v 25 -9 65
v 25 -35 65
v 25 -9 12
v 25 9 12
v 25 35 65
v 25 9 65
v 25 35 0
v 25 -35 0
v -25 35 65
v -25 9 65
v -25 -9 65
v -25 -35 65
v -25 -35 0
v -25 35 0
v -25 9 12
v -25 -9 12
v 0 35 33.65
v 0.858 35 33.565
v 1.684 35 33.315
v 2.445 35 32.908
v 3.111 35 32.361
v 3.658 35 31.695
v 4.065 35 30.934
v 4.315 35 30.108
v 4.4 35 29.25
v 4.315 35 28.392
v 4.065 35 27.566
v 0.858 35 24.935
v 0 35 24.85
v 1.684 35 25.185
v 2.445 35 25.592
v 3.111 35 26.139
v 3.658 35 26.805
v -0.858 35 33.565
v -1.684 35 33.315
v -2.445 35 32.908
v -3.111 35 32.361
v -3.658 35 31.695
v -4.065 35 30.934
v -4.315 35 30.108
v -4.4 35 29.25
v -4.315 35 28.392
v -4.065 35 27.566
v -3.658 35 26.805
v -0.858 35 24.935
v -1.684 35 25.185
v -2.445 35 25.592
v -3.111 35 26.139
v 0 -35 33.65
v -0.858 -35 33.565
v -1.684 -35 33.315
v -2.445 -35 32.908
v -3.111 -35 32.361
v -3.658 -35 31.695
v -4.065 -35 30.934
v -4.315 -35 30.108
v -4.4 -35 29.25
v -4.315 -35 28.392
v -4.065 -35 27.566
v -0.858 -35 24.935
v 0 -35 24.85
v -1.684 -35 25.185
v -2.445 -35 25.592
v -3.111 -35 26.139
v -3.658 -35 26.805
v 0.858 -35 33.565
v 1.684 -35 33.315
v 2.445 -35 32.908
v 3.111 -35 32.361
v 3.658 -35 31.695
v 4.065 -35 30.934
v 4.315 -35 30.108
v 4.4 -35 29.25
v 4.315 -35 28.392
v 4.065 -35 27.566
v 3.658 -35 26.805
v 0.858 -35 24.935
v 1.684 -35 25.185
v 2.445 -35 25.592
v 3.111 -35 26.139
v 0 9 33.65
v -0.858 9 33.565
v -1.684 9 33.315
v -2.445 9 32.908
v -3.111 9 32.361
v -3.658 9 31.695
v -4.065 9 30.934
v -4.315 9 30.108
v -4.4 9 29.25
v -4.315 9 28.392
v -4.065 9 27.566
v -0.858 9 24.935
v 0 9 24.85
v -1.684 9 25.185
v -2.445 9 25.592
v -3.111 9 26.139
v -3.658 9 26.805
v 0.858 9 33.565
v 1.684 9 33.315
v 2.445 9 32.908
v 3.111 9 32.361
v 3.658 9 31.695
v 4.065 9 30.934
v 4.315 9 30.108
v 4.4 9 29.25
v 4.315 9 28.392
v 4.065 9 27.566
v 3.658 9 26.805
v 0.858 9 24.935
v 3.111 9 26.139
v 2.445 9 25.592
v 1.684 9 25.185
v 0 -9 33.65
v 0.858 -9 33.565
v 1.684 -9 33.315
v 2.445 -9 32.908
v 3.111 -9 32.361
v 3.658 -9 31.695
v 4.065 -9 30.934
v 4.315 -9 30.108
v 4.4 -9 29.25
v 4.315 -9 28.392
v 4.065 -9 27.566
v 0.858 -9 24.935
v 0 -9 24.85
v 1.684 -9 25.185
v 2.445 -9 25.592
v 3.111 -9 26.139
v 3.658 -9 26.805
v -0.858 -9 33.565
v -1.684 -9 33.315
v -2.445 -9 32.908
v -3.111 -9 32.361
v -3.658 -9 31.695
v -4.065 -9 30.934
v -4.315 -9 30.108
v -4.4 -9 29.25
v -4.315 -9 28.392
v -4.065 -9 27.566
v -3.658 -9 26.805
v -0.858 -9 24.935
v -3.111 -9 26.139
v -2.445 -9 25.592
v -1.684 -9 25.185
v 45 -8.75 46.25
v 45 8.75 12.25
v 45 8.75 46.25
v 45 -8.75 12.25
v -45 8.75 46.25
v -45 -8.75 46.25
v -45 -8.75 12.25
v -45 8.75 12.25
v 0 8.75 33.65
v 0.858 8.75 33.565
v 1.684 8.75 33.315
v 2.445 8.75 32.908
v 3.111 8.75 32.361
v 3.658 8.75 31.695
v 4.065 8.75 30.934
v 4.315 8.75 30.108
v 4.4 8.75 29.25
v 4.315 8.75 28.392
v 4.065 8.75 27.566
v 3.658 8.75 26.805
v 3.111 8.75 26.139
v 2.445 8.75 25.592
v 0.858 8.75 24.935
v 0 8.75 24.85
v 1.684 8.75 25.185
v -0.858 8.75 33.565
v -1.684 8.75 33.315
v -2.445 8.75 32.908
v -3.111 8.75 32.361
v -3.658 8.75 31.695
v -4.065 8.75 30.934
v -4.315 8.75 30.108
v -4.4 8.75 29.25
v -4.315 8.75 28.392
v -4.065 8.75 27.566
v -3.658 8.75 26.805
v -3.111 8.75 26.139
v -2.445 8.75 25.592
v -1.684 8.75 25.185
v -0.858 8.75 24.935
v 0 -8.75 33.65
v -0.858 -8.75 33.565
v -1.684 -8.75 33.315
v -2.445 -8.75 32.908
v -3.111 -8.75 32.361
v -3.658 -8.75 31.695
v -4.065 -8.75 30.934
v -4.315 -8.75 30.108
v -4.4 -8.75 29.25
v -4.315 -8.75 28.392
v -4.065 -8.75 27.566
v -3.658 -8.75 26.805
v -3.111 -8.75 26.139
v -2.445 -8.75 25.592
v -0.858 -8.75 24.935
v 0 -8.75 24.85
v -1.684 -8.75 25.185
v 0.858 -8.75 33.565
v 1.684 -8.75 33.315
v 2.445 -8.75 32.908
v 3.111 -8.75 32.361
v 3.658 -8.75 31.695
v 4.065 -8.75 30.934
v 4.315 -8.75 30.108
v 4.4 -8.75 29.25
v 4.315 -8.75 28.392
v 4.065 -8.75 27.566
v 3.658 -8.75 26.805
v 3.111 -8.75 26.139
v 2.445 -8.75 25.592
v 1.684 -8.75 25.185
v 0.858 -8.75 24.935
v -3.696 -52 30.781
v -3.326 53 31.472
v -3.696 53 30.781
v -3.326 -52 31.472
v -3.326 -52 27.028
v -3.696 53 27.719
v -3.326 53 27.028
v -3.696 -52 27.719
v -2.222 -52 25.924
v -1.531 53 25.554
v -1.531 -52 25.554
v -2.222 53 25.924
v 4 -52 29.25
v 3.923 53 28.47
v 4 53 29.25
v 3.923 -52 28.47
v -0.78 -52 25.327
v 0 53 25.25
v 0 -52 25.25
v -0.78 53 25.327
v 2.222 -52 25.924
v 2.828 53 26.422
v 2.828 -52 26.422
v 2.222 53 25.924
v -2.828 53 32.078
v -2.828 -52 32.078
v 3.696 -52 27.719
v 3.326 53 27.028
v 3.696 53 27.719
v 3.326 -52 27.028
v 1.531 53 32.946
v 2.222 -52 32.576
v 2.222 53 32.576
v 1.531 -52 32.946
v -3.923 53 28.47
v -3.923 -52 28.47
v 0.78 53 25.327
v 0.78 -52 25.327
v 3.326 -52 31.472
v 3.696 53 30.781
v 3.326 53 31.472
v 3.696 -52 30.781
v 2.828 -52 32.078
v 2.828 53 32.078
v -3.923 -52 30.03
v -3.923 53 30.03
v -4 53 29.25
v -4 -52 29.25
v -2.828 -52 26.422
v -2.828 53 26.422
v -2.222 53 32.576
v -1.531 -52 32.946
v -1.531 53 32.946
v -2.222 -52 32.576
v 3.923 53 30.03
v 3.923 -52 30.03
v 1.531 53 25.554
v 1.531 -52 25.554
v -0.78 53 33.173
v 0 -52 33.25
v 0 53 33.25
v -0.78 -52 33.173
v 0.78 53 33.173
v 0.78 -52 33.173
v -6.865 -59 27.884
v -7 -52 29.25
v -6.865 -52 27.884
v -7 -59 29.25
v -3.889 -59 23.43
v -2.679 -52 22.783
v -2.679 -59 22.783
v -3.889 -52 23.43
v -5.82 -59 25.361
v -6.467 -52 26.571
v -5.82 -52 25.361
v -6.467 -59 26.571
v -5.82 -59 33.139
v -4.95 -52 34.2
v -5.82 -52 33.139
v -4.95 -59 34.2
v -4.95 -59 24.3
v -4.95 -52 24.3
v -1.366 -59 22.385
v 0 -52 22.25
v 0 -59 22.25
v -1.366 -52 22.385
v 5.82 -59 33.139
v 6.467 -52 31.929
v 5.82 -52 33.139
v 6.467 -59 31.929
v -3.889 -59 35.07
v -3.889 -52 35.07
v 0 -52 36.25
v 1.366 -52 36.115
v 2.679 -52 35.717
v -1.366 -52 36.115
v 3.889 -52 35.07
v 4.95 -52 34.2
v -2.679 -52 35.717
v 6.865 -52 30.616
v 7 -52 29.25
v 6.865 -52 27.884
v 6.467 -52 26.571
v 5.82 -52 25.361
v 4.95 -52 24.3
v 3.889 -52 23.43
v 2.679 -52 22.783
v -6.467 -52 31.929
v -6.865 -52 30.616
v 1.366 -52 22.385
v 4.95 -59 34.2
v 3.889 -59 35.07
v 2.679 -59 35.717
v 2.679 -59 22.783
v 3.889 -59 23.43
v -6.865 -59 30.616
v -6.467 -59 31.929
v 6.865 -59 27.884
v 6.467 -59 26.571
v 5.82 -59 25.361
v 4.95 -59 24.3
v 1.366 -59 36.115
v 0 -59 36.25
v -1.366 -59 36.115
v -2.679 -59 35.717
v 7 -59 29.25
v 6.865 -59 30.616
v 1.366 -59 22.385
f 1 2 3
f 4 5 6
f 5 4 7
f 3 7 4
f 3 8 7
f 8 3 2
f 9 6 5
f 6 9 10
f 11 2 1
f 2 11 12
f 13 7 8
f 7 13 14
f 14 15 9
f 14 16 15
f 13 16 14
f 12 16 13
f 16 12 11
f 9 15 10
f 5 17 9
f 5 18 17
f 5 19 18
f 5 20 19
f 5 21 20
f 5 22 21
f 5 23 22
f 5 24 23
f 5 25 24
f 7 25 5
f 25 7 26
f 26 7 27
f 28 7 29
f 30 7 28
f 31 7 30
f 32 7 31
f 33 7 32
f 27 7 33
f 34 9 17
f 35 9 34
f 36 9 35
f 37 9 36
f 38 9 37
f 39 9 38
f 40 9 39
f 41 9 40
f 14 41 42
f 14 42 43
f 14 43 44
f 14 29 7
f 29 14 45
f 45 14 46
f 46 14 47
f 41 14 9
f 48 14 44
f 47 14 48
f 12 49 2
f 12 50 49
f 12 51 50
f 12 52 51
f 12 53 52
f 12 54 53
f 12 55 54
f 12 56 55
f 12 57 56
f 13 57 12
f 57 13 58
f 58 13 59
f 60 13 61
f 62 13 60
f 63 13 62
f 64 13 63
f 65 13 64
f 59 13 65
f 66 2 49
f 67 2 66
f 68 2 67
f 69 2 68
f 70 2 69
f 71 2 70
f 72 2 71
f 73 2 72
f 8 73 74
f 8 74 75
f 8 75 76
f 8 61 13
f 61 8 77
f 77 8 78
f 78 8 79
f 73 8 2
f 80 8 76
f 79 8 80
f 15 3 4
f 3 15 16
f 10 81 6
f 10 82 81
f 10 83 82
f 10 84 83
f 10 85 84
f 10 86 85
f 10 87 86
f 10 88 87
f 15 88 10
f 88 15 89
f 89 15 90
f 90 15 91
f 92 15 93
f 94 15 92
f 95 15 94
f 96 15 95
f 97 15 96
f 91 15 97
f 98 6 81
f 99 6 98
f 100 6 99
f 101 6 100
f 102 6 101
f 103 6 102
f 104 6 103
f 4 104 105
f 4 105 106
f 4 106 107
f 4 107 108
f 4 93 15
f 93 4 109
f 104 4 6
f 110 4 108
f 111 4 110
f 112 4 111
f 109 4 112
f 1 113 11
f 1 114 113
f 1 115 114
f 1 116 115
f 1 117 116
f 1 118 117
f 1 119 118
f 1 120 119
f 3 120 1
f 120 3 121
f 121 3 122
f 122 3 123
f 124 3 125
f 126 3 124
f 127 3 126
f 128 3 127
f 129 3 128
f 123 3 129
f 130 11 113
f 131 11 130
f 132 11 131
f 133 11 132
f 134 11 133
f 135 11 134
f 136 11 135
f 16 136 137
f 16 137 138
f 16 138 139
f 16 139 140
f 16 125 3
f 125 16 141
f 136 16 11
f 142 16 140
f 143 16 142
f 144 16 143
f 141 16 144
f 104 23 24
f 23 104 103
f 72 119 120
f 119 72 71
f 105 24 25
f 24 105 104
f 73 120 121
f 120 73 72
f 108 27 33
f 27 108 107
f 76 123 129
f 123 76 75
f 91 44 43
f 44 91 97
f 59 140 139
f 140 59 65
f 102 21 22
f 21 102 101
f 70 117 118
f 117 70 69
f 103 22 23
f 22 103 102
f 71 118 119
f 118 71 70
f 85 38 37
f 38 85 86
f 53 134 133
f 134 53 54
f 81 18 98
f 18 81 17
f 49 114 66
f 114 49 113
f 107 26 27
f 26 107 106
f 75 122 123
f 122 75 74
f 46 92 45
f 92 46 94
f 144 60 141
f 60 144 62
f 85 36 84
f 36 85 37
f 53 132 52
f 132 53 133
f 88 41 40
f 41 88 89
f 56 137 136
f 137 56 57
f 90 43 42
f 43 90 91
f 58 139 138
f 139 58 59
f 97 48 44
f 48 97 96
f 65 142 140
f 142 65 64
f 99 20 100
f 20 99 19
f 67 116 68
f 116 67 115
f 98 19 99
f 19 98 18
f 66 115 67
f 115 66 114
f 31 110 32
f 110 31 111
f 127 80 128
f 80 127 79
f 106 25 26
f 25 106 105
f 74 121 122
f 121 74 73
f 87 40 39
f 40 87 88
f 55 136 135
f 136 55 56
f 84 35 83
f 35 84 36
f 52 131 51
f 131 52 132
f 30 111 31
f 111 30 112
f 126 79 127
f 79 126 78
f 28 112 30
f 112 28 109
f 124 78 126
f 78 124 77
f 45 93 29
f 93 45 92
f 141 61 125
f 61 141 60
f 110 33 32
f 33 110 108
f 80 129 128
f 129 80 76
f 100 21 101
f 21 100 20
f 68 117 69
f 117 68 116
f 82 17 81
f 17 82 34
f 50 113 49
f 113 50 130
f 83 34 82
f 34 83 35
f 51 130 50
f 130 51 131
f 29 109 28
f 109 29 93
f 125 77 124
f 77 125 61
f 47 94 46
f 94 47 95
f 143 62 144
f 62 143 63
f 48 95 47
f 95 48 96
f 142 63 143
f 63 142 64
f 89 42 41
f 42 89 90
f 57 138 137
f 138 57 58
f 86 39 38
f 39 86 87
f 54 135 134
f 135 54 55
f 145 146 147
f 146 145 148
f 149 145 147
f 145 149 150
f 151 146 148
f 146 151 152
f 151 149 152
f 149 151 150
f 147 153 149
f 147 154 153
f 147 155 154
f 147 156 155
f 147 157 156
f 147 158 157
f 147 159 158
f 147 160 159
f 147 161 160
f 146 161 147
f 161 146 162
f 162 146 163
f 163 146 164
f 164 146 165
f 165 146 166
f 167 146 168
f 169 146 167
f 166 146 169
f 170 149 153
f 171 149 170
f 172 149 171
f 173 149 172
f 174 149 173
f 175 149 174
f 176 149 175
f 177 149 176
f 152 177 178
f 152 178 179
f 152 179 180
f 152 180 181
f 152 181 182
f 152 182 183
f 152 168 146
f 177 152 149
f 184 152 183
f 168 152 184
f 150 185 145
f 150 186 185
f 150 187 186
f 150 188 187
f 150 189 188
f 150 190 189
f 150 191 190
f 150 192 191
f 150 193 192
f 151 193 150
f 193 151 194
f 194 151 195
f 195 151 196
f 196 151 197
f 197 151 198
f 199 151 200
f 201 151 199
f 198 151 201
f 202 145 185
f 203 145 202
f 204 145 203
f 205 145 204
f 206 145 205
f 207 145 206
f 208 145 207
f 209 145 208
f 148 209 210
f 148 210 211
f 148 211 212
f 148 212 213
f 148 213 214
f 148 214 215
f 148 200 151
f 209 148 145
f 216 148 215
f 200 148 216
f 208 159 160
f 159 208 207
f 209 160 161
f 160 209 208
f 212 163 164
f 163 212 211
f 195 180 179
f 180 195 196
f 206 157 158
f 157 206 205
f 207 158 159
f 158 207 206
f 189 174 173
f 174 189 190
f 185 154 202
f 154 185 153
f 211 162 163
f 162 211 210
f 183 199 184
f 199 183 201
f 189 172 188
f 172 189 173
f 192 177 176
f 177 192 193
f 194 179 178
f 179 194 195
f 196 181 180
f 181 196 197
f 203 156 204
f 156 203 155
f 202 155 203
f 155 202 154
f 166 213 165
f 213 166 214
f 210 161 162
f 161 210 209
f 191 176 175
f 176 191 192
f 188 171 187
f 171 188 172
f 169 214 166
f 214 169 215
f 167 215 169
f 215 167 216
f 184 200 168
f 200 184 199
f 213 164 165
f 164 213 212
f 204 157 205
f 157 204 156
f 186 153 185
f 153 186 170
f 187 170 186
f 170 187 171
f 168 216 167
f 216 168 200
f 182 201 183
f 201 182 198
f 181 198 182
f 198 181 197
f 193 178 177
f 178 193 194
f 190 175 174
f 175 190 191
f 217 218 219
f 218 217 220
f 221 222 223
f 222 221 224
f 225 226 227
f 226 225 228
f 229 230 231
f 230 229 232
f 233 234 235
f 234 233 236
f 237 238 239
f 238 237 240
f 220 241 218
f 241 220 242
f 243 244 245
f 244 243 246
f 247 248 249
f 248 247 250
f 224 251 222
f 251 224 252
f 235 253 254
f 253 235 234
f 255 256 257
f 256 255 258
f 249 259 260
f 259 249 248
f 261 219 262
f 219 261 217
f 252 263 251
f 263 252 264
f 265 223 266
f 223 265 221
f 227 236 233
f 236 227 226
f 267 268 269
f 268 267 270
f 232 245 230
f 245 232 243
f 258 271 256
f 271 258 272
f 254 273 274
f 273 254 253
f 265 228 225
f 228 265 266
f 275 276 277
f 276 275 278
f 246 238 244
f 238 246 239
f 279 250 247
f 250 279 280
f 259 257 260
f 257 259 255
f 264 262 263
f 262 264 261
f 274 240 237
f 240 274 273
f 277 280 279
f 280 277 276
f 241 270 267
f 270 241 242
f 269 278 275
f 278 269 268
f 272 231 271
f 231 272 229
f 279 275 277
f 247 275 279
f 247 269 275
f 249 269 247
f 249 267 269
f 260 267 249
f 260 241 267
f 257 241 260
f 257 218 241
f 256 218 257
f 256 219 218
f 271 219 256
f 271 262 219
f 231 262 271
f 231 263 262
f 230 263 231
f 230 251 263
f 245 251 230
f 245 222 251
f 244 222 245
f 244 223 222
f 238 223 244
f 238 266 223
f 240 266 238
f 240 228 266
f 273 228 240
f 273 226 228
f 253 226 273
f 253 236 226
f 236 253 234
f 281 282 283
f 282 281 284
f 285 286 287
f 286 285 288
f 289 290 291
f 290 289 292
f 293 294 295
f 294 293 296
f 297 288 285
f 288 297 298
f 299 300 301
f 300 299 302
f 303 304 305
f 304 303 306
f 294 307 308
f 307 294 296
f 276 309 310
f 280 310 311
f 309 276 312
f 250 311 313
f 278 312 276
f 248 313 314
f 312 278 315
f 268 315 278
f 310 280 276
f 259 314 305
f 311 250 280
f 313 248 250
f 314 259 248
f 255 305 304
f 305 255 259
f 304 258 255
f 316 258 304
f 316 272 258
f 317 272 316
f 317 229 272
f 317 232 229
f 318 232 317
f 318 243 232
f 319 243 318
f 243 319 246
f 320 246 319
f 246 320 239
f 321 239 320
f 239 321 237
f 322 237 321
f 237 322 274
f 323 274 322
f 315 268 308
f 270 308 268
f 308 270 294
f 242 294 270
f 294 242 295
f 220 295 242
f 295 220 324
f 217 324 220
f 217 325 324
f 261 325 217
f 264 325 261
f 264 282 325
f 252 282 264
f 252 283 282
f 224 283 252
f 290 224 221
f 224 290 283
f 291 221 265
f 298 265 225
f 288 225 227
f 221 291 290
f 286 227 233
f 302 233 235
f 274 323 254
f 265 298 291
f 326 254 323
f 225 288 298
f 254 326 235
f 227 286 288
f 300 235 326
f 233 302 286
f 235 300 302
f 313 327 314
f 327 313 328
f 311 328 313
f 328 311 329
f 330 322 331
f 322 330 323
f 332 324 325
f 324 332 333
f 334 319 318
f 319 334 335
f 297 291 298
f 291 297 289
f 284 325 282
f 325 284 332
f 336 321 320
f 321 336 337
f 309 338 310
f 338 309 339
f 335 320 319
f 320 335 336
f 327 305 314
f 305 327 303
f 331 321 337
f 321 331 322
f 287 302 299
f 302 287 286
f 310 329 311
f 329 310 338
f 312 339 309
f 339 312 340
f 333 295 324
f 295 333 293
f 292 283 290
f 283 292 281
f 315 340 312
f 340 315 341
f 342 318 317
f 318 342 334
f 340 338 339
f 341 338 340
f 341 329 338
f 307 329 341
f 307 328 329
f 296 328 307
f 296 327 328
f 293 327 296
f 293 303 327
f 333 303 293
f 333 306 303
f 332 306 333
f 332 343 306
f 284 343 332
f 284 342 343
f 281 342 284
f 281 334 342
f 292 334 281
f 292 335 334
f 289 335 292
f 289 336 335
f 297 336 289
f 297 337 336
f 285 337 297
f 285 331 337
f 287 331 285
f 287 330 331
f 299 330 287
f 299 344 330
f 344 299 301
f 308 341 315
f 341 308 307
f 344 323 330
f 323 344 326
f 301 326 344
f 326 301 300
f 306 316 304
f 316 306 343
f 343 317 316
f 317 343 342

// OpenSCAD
$fn = 32;

// ------------------------------------------------------------------------
// Clevis joint: 50 mm clevis, pin d8
// Every part is its own module, assembly() places them once.
// ------------------------------------------------------------------------

// --- part 1 ---
module clevis() {
  difference() {
    translate([-25, -35, 0]) cube([50, 70, 65]);
    translate([-26, -9, 12]) cube([52, 18, 54]);
    translate([0, 0, 29.25]) rotate([90, 0, 0]) cylinder(h = 72, d = 8.8, center = true);
  }
}

// --- part 2 ---
module eye() {
  difference() {
    translate([-45, -8.75, 0]) cube([90, 17.5, 34]);
    translate([0, 0, 17]) rotate([90, 0, 0]) cylinder(h = 19.5, d = 8.8, center = true);
  }
}

// --- part 3 ---
module pin() {
  rotate([0, 90, 0]) cylinder(h = 106, d = 8, center = true);
  translate([-59, 0, 0]) rotate([0, 90, 0]) cylinder(h = 7, d = 14);
}

// --- assembly ---
module assembly() {
  translate([0, 0, 0]) rotate([0, 0, 0]) clevis();
  translate([0, 0, 12.25]) rotate([0, 0, 0]) eye();
  translate([0, 0, 29.25]) rotate([0, 0, 90]) pin();
}

assembly();
